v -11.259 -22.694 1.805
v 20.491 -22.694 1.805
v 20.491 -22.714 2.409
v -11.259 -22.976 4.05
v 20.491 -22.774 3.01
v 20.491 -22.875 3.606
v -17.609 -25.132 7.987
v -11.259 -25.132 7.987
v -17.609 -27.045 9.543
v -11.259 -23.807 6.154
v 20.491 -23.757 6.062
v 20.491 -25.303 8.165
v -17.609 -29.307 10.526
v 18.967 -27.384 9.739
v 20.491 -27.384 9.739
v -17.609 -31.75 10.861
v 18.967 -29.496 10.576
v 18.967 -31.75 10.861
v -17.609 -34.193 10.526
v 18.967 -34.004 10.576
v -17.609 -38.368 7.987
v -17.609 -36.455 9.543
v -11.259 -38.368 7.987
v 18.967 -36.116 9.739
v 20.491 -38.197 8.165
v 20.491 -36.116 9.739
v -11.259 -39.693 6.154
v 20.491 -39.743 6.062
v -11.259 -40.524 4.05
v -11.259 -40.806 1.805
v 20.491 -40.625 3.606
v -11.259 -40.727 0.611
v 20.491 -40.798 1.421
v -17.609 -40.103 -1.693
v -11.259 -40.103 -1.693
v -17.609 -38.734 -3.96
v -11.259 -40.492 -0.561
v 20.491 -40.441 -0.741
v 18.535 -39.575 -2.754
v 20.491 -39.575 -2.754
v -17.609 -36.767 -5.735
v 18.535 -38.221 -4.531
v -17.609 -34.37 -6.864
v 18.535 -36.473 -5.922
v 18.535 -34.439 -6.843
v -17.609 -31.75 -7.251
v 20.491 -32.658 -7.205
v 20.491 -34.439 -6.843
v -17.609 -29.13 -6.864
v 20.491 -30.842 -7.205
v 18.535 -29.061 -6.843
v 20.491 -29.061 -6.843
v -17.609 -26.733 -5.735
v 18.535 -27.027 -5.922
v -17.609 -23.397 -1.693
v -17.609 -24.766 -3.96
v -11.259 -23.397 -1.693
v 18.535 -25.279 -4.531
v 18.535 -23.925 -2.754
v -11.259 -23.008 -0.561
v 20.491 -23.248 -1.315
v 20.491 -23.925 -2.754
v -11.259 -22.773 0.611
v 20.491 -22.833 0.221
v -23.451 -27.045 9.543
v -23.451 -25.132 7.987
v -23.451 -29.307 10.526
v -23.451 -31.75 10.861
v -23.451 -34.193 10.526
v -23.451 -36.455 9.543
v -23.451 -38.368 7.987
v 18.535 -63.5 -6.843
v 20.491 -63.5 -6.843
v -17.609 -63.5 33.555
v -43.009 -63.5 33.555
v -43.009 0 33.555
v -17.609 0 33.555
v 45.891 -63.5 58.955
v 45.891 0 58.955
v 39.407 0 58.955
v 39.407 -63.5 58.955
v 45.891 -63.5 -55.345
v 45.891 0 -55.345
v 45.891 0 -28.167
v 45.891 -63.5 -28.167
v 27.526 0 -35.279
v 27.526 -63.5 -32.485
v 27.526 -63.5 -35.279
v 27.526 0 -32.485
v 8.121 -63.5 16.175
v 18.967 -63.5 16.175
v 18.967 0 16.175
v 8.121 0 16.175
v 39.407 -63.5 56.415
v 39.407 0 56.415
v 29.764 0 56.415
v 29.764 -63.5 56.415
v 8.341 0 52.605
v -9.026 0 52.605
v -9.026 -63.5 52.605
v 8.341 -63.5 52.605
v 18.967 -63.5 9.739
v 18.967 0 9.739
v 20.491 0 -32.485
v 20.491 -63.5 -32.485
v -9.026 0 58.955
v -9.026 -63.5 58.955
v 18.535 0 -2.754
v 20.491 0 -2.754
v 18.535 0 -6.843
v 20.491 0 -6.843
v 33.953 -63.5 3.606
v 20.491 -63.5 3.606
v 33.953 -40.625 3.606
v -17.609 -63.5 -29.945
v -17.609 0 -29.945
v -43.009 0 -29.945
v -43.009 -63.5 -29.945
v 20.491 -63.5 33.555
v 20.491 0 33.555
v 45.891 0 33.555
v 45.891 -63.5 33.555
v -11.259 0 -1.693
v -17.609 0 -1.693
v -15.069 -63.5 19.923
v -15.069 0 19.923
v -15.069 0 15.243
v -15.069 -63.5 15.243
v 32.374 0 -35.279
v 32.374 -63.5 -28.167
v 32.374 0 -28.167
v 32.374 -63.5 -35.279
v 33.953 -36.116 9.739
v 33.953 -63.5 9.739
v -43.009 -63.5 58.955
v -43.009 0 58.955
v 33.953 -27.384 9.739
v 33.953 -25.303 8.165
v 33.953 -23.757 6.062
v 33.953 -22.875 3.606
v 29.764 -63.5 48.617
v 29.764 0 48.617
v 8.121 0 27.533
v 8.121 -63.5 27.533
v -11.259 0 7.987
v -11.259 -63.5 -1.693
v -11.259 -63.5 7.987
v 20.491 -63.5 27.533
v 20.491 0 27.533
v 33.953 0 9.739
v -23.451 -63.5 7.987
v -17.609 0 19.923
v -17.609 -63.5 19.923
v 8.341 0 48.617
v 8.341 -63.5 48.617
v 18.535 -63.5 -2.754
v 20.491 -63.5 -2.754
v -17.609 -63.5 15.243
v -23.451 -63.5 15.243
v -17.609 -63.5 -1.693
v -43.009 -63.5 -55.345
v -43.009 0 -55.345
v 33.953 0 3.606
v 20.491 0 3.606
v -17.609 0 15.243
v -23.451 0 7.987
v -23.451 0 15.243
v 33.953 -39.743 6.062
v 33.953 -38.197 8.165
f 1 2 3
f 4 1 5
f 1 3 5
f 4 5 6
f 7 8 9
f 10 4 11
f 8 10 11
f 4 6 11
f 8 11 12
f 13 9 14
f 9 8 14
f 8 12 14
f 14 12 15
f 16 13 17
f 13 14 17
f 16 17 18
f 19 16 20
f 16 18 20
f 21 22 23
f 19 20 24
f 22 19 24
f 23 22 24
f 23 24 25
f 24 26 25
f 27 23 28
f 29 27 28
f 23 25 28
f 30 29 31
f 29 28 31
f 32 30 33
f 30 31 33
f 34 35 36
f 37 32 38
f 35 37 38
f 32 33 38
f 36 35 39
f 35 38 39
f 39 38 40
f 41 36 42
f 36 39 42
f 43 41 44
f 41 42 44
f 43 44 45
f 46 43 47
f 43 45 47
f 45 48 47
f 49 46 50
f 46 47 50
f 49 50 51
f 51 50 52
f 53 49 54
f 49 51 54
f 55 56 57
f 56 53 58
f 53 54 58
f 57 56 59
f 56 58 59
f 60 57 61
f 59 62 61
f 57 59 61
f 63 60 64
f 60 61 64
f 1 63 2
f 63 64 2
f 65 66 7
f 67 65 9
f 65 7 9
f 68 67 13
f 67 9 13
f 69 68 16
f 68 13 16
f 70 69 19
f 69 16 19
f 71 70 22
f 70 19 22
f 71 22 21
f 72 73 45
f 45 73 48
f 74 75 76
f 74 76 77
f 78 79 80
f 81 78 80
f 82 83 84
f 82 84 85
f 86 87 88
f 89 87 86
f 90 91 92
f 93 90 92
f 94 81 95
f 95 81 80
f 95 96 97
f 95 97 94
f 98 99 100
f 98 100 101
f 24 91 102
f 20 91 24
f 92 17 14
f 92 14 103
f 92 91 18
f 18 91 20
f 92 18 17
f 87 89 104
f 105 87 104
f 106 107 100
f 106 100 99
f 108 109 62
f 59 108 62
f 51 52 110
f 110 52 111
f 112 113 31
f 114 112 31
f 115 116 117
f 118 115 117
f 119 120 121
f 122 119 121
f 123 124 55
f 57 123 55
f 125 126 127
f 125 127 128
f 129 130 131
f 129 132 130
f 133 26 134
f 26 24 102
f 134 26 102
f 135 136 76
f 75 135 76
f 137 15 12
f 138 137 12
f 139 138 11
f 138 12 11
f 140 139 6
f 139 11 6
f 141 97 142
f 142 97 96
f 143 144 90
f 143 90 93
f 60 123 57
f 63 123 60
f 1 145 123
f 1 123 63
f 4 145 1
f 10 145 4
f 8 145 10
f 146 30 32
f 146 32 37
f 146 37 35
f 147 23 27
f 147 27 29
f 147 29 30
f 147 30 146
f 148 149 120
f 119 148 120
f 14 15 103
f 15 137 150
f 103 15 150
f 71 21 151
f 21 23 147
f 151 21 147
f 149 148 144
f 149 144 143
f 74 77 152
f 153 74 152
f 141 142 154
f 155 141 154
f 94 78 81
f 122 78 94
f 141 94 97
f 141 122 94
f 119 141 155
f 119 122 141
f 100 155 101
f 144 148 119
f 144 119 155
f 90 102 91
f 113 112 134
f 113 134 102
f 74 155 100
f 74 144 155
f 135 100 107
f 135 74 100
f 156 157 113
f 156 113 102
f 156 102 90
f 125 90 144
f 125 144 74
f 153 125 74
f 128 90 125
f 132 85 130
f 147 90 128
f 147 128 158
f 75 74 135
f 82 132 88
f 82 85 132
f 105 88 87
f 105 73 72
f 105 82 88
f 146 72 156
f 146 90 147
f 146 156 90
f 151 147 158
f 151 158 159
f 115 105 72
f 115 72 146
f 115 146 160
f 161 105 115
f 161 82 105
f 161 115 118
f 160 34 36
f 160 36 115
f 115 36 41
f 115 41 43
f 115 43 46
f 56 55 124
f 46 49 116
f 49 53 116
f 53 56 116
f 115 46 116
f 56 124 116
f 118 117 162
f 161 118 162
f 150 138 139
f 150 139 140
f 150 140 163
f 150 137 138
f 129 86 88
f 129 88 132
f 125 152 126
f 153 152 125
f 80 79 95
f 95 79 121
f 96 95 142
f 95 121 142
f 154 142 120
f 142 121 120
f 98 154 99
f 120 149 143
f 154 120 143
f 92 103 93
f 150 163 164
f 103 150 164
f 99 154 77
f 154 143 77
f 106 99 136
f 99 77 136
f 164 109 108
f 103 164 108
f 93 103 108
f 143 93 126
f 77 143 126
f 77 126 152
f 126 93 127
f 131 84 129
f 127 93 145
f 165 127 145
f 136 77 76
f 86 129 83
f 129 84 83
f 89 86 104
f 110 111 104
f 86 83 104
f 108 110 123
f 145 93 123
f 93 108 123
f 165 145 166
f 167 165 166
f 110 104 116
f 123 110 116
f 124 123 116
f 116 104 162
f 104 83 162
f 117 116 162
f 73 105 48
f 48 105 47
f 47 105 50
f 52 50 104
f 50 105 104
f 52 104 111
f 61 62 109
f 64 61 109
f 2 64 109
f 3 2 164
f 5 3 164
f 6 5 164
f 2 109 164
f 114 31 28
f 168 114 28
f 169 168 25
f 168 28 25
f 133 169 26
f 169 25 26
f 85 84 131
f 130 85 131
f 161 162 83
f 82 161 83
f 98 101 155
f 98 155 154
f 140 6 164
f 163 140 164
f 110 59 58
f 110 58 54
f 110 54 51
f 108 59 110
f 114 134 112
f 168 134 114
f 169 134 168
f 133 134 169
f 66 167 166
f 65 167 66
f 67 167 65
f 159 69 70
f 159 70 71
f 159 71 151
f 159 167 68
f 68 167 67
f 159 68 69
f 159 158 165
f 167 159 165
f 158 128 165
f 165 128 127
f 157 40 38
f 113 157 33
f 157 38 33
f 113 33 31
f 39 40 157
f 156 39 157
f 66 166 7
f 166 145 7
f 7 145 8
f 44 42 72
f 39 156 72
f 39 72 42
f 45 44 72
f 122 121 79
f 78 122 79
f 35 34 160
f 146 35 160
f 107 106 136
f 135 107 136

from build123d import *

# Parameters (mm, degrees)
F1_DEPTH  = 63.5
F2_R      = 9.0561828793
F3_DEPTH  = 63.501
F4_W      = 17.3674514517
F4_H      = 63.5
F5_DEPTH  = 6.35
F6_W      = 9.6430126578
F6_H      = 63.5
F7_DEPTH  = 2.54
F8_DEPTH  = 10.3378
F9_W      = 63.5
F9_H      = 4.6800179407
F10_DEPTH = 2.54
F11_DEPTH = 6.35
F12_DEPTH = 6.35
F13_DEPTH = 5.842
F14_W     = 63.5
F14_H     = 11.3577079028
F15_DEPTH = 12.3698
F16_DEPTH = 13.462
F17_DEPTH = 13.462
F18_DEPTH = 1.524
F19_DEPTH = 1.9558
F20_DEPTH = 1.9558
F21_W     = 4.8483535647
F21_H     = 63.5
F22_DEPTH = 5.334
F23_DEPTH = 1.778
F24_DEPTH = 2.54


with BuildPart() as f1:
    # F0 (on Front) → F1 (new body)
    with BuildSketch(Plane.XZ):
        Polygon((-43.0088681884, -29.9449780501), (-43.0088681884, -55.3449780501), (45.8911318116, -55.3449780501), (45.8911318116, -29.9449780501), (20.4911318116, -29.9449780501), (20.4911318116, 33.5550219499), (45.8911318116, 33.5550219499), (45.8911318116, 58.9550219499), (-43.0088681884, 58.9550219499), (-43.0088681884, 33.5550219499), (-17.6088681884, 33.5550219499), (-17.6088681884, -29.9449780501), align=None)
    extrude(amount=F1_DEPTH)

    # F2 (on face) → F3 (cut, through all)
    with BuildSketch(Plane.YZ.offset(20.4911318116)):
        with Locations((-31.75, 1.8050219499)):
            Circle(F2_R)
    extrude(amount=-F3_DEPTH, mode=Mode.SUBTRACT)

    # F4 (on face) → F5 (cut)
    with BuildSketch(Plane.XY.offset(58.9550219499)):
        with Locations((-0.3427523188, -31.75)):
            Rectangle(F4_W, F4_H)
    extrude(amount=-F5_DEPTH, mode=Mode.SUBTRACT)

    # F6 (on face) → F7 (cut)
    with BuildSketch(Plane.XY.offset(58.9550219499)):
        with Locations((34.5854004845, -31.75)):
            Rectangle(F6_W, F6_H)
    extrude(amount=-F7_DEPTH, mode=Mode.SUBTRACT)

    # F8 (cut): a face of the model
    f8_faces = [f1.faces().sort_by_distance(p)[0] for p in [
        (19.0524337813, -31.75, 58.9550219499),
    ]]
    extrude(f8_faces, amount=-F8_DEPTH, mode=Mode.SUBTRACT)

    # F9 (on face) → F10 (cut)
    with BuildSketch(Plane(origin=(-17.6088681884, 0, 0), x_dir=(0, -1, 0), z_dir=(-1, 0, 0))):
        with Locations((31.75, 17.5831750967)):
            Rectangle(F9_W, F9_H)
    extrude(amount=-F10_DEPTH, mode=Mode.SUBTRACT)

    # F9 (on face) → F11 (cut)
    with BuildSketch(Plane(origin=(-17.6088681884, 0, 0), x_dir=(0, -1, 0), z_dir=(-1, 0, 0))):
        with BuildLine():
            Line((63.5, -1.6929475823), (63.5, 7.987478748))
            Line((63.5, 7.987478748), (38.3675279587, 7.987478748))
            ThreePointArc((38.3675279587, 7.987478748), (40.1744878701, 5.128040528), (40.8061828793, 1.8050219499))
            ThreePointArc((40.8061828793, 1.8050219499), (40.6287392884, 0.021083332), (40.1033620474, -1.6929475823))
            Line((40.1033620474, -1.6929475823), (63.5, -1.6929475823))
        make_face()
    extrude(amount=-F11_DEPTH, mode=Mode.SUBTRACT)

    # F9 (on face) → F12 (cut)
    with BuildSketch(Plane(origin=(-17.6088681884, 0, 0), x_dir=(0, -1, 0), z_dir=(-1, 0, 0))):
        with BuildLine():
            Line((25.1324720413, 7.987478748), (0, 7.987478748))
            Line((0, 7.987478748), (0, -1.6929475823))
            Line((0, -1.6929475823), (23.3966379526, -1.6929475823))
            ThreePointArc((23.3966379526, -1.6929475823), (22.8359913407, 3.4034267691), (25.1324720413, 7.987478748))
        make_face()
    extrude(amount=-F12_DEPTH, mode=Mode.SUBTRACT)

    # F9 (on face) → F13 (join)
    with BuildSketch(Plane(origin=(-17.6088681884, 0, 0), x_dir=(0, -1, 0), z_dir=(-1, 0, 0))):
        with BuildLine():
            Line((63.5, 7.987478748), (63.5, 15.2431661263))
            Line((63.5, 15.2431661263), (0, 15.2431661263))
            Line((0, 15.2431661263), (0, 7.987478748))
            Line((0, 7.987478748), (25.1324720413, 7.987478748))
            ThreePointArc((25.1324720413, 7.987478748), (31.75, 10.8612048292), (38.3675279587, 7.987478748))
            Line((38.3675279587, 7.987478748), (63.5, 7.987478748))
        make_face()
    extrude(amount=F13_DEPTH)

    # F14 (on face) → F15 (cut)
    with BuildSketch(Plane.YZ.offset(20.4911318116)):
        with Locations((-31.75, 21.8542935327)):
            Rectangle(F14_W, F14_H)
    extrude(amount=-F15_DEPTH, mode=Mode.SUBTRACT)

    # F14 (on face) → F16 (join)
    with BuildSketch(Plane.YZ.offset(20.4911318116)):
        with BuildLine():
            Line((-36.1157784174, 9.7394045442), (-63.5, 9.7394045442))
            Line((-63.5, 9.7394045442), (-63.5, 3.6062416621))
            Line((-63.5, 3.6062416621), (-40.6252496242, 3.6062416621))
            ThreePointArc((-40.6252496242, 3.6062416621), (-39.0462406508, 7.1696580707), (-36.1157784174, 9.7394045442))
        make_face()
    extrude(amount=F16_DEPTH)

    # F14 (on face) → F17 (join)
    with BuildSketch(Plane.YZ.offset(20.4911318116)):
        with BuildLine():
            Line((0, 3.6062416621), (0, 9.7394045442))
            Line((0, 9.7394045442), (-27.3842215826, 9.7394045442))
            ThreePointArc((-27.3842215826, 9.7394045442), (-24.4537593492, 7.1696580707), (-22.8747503758, 3.6062416621))
            Line((-22.8747503758, 3.6062416621), (0, 3.6062416621))
        make_face()
    extrude(amount=F17_DEPTH)

    # F14 (on face) → F18 (cut)
    with BuildSketch(Plane.YZ.offset(20.4911318116)):
        with BuildLine():
            Line((0, 16.1754395813), (-63.5, 16.1754395813))
            Line((-63.5, 16.1754395813), (-63.5, 9.7394045442))
            Line((-63.5, 9.7394045442), (-36.1157784174, 9.7394045442))
            ThreePointArc((-36.1157784174, 9.7394045442), (-31.75, 10.8612048292), (-27.3842215826, 9.7394045442))
            Line((-27.3842215826, 9.7394045442), (0, 9.7394045442))
            Line((0, 9.7394045442), (0, 16.1754395813))
        make_face()
    extrude(amount=-F18_DEPTH, mode=Mode.SUBTRACT)

    # F14 (on face) → F19 (cut)
    with BuildSketch(Plane.YZ.offset(20.4911318116)):
        with BuildLine():
            Line((-39.574901363, -2.7540752199), (-63.5, -2.7540752199))
            Line((-63.5, -2.7540752199), (-63.5, -6.8428497761))
            Line((-63.5, -6.8428497761), (-34.4386358909, -6.8428497761))
            ThreePointArc((-34.4386358909, -6.8428497761), (-37.3903134435, -5.2802665131), (-39.574901363, -2.7540752199))
        make_face()
    extrude(amount=-F19_DEPTH, mode=Mode.SUBTRACT)

    # F14 (on face) → F20 (cut)
    with BuildSketch(Plane.YZ.offset(20.4911318116)):
        with BuildLine():
            Line((0, -6.8428497761), (0, -2.7540752199))
            Line((0, -2.7540752199), (-23.925098637, -2.7540752199))
            ThreePointArc((-23.925098637, -2.7540752199), (-26.1096865565, -5.2802665131), (-29.0613641091, -6.8428497761))
            Line((-29.0613641091, -6.8428497761), (0, -6.8428497761))
        make_face()
    extrude(amount=-F20_DEPTH, mode=Mode.SUBTRACT)

    # F21 (on face) → F22 (cut)
    with BuildSketch(Plane.XY.offset(-29.9449780501)):
        with Locations((29.9499258399, -31.75)):
            Rectangle(F21_W, F21_H)
    extrude(amount=-F22_DEPTH, mode=Mode.SUBTRACT)

    # F23 (add): a face of the model
    f23_faces = [f1.faces().sort_by_distance(p)[0] for p in [
        (39.1326172169, -31.75, -29.9449780501),
    ]]
    extrude(f23_faces, amount=F23_DEPTH)

    # F24 (cut): a face of the model
    f24_faces = [f1.faces().sort_by_distance(p)[0] for p in [
        (24.0084404346, -31.75, -29.9449780501),
    ]]
    extrude(f24_faces, amount=-F24_DEPTH, mode=Mode.SUBTRACT)


solid = f1.part
